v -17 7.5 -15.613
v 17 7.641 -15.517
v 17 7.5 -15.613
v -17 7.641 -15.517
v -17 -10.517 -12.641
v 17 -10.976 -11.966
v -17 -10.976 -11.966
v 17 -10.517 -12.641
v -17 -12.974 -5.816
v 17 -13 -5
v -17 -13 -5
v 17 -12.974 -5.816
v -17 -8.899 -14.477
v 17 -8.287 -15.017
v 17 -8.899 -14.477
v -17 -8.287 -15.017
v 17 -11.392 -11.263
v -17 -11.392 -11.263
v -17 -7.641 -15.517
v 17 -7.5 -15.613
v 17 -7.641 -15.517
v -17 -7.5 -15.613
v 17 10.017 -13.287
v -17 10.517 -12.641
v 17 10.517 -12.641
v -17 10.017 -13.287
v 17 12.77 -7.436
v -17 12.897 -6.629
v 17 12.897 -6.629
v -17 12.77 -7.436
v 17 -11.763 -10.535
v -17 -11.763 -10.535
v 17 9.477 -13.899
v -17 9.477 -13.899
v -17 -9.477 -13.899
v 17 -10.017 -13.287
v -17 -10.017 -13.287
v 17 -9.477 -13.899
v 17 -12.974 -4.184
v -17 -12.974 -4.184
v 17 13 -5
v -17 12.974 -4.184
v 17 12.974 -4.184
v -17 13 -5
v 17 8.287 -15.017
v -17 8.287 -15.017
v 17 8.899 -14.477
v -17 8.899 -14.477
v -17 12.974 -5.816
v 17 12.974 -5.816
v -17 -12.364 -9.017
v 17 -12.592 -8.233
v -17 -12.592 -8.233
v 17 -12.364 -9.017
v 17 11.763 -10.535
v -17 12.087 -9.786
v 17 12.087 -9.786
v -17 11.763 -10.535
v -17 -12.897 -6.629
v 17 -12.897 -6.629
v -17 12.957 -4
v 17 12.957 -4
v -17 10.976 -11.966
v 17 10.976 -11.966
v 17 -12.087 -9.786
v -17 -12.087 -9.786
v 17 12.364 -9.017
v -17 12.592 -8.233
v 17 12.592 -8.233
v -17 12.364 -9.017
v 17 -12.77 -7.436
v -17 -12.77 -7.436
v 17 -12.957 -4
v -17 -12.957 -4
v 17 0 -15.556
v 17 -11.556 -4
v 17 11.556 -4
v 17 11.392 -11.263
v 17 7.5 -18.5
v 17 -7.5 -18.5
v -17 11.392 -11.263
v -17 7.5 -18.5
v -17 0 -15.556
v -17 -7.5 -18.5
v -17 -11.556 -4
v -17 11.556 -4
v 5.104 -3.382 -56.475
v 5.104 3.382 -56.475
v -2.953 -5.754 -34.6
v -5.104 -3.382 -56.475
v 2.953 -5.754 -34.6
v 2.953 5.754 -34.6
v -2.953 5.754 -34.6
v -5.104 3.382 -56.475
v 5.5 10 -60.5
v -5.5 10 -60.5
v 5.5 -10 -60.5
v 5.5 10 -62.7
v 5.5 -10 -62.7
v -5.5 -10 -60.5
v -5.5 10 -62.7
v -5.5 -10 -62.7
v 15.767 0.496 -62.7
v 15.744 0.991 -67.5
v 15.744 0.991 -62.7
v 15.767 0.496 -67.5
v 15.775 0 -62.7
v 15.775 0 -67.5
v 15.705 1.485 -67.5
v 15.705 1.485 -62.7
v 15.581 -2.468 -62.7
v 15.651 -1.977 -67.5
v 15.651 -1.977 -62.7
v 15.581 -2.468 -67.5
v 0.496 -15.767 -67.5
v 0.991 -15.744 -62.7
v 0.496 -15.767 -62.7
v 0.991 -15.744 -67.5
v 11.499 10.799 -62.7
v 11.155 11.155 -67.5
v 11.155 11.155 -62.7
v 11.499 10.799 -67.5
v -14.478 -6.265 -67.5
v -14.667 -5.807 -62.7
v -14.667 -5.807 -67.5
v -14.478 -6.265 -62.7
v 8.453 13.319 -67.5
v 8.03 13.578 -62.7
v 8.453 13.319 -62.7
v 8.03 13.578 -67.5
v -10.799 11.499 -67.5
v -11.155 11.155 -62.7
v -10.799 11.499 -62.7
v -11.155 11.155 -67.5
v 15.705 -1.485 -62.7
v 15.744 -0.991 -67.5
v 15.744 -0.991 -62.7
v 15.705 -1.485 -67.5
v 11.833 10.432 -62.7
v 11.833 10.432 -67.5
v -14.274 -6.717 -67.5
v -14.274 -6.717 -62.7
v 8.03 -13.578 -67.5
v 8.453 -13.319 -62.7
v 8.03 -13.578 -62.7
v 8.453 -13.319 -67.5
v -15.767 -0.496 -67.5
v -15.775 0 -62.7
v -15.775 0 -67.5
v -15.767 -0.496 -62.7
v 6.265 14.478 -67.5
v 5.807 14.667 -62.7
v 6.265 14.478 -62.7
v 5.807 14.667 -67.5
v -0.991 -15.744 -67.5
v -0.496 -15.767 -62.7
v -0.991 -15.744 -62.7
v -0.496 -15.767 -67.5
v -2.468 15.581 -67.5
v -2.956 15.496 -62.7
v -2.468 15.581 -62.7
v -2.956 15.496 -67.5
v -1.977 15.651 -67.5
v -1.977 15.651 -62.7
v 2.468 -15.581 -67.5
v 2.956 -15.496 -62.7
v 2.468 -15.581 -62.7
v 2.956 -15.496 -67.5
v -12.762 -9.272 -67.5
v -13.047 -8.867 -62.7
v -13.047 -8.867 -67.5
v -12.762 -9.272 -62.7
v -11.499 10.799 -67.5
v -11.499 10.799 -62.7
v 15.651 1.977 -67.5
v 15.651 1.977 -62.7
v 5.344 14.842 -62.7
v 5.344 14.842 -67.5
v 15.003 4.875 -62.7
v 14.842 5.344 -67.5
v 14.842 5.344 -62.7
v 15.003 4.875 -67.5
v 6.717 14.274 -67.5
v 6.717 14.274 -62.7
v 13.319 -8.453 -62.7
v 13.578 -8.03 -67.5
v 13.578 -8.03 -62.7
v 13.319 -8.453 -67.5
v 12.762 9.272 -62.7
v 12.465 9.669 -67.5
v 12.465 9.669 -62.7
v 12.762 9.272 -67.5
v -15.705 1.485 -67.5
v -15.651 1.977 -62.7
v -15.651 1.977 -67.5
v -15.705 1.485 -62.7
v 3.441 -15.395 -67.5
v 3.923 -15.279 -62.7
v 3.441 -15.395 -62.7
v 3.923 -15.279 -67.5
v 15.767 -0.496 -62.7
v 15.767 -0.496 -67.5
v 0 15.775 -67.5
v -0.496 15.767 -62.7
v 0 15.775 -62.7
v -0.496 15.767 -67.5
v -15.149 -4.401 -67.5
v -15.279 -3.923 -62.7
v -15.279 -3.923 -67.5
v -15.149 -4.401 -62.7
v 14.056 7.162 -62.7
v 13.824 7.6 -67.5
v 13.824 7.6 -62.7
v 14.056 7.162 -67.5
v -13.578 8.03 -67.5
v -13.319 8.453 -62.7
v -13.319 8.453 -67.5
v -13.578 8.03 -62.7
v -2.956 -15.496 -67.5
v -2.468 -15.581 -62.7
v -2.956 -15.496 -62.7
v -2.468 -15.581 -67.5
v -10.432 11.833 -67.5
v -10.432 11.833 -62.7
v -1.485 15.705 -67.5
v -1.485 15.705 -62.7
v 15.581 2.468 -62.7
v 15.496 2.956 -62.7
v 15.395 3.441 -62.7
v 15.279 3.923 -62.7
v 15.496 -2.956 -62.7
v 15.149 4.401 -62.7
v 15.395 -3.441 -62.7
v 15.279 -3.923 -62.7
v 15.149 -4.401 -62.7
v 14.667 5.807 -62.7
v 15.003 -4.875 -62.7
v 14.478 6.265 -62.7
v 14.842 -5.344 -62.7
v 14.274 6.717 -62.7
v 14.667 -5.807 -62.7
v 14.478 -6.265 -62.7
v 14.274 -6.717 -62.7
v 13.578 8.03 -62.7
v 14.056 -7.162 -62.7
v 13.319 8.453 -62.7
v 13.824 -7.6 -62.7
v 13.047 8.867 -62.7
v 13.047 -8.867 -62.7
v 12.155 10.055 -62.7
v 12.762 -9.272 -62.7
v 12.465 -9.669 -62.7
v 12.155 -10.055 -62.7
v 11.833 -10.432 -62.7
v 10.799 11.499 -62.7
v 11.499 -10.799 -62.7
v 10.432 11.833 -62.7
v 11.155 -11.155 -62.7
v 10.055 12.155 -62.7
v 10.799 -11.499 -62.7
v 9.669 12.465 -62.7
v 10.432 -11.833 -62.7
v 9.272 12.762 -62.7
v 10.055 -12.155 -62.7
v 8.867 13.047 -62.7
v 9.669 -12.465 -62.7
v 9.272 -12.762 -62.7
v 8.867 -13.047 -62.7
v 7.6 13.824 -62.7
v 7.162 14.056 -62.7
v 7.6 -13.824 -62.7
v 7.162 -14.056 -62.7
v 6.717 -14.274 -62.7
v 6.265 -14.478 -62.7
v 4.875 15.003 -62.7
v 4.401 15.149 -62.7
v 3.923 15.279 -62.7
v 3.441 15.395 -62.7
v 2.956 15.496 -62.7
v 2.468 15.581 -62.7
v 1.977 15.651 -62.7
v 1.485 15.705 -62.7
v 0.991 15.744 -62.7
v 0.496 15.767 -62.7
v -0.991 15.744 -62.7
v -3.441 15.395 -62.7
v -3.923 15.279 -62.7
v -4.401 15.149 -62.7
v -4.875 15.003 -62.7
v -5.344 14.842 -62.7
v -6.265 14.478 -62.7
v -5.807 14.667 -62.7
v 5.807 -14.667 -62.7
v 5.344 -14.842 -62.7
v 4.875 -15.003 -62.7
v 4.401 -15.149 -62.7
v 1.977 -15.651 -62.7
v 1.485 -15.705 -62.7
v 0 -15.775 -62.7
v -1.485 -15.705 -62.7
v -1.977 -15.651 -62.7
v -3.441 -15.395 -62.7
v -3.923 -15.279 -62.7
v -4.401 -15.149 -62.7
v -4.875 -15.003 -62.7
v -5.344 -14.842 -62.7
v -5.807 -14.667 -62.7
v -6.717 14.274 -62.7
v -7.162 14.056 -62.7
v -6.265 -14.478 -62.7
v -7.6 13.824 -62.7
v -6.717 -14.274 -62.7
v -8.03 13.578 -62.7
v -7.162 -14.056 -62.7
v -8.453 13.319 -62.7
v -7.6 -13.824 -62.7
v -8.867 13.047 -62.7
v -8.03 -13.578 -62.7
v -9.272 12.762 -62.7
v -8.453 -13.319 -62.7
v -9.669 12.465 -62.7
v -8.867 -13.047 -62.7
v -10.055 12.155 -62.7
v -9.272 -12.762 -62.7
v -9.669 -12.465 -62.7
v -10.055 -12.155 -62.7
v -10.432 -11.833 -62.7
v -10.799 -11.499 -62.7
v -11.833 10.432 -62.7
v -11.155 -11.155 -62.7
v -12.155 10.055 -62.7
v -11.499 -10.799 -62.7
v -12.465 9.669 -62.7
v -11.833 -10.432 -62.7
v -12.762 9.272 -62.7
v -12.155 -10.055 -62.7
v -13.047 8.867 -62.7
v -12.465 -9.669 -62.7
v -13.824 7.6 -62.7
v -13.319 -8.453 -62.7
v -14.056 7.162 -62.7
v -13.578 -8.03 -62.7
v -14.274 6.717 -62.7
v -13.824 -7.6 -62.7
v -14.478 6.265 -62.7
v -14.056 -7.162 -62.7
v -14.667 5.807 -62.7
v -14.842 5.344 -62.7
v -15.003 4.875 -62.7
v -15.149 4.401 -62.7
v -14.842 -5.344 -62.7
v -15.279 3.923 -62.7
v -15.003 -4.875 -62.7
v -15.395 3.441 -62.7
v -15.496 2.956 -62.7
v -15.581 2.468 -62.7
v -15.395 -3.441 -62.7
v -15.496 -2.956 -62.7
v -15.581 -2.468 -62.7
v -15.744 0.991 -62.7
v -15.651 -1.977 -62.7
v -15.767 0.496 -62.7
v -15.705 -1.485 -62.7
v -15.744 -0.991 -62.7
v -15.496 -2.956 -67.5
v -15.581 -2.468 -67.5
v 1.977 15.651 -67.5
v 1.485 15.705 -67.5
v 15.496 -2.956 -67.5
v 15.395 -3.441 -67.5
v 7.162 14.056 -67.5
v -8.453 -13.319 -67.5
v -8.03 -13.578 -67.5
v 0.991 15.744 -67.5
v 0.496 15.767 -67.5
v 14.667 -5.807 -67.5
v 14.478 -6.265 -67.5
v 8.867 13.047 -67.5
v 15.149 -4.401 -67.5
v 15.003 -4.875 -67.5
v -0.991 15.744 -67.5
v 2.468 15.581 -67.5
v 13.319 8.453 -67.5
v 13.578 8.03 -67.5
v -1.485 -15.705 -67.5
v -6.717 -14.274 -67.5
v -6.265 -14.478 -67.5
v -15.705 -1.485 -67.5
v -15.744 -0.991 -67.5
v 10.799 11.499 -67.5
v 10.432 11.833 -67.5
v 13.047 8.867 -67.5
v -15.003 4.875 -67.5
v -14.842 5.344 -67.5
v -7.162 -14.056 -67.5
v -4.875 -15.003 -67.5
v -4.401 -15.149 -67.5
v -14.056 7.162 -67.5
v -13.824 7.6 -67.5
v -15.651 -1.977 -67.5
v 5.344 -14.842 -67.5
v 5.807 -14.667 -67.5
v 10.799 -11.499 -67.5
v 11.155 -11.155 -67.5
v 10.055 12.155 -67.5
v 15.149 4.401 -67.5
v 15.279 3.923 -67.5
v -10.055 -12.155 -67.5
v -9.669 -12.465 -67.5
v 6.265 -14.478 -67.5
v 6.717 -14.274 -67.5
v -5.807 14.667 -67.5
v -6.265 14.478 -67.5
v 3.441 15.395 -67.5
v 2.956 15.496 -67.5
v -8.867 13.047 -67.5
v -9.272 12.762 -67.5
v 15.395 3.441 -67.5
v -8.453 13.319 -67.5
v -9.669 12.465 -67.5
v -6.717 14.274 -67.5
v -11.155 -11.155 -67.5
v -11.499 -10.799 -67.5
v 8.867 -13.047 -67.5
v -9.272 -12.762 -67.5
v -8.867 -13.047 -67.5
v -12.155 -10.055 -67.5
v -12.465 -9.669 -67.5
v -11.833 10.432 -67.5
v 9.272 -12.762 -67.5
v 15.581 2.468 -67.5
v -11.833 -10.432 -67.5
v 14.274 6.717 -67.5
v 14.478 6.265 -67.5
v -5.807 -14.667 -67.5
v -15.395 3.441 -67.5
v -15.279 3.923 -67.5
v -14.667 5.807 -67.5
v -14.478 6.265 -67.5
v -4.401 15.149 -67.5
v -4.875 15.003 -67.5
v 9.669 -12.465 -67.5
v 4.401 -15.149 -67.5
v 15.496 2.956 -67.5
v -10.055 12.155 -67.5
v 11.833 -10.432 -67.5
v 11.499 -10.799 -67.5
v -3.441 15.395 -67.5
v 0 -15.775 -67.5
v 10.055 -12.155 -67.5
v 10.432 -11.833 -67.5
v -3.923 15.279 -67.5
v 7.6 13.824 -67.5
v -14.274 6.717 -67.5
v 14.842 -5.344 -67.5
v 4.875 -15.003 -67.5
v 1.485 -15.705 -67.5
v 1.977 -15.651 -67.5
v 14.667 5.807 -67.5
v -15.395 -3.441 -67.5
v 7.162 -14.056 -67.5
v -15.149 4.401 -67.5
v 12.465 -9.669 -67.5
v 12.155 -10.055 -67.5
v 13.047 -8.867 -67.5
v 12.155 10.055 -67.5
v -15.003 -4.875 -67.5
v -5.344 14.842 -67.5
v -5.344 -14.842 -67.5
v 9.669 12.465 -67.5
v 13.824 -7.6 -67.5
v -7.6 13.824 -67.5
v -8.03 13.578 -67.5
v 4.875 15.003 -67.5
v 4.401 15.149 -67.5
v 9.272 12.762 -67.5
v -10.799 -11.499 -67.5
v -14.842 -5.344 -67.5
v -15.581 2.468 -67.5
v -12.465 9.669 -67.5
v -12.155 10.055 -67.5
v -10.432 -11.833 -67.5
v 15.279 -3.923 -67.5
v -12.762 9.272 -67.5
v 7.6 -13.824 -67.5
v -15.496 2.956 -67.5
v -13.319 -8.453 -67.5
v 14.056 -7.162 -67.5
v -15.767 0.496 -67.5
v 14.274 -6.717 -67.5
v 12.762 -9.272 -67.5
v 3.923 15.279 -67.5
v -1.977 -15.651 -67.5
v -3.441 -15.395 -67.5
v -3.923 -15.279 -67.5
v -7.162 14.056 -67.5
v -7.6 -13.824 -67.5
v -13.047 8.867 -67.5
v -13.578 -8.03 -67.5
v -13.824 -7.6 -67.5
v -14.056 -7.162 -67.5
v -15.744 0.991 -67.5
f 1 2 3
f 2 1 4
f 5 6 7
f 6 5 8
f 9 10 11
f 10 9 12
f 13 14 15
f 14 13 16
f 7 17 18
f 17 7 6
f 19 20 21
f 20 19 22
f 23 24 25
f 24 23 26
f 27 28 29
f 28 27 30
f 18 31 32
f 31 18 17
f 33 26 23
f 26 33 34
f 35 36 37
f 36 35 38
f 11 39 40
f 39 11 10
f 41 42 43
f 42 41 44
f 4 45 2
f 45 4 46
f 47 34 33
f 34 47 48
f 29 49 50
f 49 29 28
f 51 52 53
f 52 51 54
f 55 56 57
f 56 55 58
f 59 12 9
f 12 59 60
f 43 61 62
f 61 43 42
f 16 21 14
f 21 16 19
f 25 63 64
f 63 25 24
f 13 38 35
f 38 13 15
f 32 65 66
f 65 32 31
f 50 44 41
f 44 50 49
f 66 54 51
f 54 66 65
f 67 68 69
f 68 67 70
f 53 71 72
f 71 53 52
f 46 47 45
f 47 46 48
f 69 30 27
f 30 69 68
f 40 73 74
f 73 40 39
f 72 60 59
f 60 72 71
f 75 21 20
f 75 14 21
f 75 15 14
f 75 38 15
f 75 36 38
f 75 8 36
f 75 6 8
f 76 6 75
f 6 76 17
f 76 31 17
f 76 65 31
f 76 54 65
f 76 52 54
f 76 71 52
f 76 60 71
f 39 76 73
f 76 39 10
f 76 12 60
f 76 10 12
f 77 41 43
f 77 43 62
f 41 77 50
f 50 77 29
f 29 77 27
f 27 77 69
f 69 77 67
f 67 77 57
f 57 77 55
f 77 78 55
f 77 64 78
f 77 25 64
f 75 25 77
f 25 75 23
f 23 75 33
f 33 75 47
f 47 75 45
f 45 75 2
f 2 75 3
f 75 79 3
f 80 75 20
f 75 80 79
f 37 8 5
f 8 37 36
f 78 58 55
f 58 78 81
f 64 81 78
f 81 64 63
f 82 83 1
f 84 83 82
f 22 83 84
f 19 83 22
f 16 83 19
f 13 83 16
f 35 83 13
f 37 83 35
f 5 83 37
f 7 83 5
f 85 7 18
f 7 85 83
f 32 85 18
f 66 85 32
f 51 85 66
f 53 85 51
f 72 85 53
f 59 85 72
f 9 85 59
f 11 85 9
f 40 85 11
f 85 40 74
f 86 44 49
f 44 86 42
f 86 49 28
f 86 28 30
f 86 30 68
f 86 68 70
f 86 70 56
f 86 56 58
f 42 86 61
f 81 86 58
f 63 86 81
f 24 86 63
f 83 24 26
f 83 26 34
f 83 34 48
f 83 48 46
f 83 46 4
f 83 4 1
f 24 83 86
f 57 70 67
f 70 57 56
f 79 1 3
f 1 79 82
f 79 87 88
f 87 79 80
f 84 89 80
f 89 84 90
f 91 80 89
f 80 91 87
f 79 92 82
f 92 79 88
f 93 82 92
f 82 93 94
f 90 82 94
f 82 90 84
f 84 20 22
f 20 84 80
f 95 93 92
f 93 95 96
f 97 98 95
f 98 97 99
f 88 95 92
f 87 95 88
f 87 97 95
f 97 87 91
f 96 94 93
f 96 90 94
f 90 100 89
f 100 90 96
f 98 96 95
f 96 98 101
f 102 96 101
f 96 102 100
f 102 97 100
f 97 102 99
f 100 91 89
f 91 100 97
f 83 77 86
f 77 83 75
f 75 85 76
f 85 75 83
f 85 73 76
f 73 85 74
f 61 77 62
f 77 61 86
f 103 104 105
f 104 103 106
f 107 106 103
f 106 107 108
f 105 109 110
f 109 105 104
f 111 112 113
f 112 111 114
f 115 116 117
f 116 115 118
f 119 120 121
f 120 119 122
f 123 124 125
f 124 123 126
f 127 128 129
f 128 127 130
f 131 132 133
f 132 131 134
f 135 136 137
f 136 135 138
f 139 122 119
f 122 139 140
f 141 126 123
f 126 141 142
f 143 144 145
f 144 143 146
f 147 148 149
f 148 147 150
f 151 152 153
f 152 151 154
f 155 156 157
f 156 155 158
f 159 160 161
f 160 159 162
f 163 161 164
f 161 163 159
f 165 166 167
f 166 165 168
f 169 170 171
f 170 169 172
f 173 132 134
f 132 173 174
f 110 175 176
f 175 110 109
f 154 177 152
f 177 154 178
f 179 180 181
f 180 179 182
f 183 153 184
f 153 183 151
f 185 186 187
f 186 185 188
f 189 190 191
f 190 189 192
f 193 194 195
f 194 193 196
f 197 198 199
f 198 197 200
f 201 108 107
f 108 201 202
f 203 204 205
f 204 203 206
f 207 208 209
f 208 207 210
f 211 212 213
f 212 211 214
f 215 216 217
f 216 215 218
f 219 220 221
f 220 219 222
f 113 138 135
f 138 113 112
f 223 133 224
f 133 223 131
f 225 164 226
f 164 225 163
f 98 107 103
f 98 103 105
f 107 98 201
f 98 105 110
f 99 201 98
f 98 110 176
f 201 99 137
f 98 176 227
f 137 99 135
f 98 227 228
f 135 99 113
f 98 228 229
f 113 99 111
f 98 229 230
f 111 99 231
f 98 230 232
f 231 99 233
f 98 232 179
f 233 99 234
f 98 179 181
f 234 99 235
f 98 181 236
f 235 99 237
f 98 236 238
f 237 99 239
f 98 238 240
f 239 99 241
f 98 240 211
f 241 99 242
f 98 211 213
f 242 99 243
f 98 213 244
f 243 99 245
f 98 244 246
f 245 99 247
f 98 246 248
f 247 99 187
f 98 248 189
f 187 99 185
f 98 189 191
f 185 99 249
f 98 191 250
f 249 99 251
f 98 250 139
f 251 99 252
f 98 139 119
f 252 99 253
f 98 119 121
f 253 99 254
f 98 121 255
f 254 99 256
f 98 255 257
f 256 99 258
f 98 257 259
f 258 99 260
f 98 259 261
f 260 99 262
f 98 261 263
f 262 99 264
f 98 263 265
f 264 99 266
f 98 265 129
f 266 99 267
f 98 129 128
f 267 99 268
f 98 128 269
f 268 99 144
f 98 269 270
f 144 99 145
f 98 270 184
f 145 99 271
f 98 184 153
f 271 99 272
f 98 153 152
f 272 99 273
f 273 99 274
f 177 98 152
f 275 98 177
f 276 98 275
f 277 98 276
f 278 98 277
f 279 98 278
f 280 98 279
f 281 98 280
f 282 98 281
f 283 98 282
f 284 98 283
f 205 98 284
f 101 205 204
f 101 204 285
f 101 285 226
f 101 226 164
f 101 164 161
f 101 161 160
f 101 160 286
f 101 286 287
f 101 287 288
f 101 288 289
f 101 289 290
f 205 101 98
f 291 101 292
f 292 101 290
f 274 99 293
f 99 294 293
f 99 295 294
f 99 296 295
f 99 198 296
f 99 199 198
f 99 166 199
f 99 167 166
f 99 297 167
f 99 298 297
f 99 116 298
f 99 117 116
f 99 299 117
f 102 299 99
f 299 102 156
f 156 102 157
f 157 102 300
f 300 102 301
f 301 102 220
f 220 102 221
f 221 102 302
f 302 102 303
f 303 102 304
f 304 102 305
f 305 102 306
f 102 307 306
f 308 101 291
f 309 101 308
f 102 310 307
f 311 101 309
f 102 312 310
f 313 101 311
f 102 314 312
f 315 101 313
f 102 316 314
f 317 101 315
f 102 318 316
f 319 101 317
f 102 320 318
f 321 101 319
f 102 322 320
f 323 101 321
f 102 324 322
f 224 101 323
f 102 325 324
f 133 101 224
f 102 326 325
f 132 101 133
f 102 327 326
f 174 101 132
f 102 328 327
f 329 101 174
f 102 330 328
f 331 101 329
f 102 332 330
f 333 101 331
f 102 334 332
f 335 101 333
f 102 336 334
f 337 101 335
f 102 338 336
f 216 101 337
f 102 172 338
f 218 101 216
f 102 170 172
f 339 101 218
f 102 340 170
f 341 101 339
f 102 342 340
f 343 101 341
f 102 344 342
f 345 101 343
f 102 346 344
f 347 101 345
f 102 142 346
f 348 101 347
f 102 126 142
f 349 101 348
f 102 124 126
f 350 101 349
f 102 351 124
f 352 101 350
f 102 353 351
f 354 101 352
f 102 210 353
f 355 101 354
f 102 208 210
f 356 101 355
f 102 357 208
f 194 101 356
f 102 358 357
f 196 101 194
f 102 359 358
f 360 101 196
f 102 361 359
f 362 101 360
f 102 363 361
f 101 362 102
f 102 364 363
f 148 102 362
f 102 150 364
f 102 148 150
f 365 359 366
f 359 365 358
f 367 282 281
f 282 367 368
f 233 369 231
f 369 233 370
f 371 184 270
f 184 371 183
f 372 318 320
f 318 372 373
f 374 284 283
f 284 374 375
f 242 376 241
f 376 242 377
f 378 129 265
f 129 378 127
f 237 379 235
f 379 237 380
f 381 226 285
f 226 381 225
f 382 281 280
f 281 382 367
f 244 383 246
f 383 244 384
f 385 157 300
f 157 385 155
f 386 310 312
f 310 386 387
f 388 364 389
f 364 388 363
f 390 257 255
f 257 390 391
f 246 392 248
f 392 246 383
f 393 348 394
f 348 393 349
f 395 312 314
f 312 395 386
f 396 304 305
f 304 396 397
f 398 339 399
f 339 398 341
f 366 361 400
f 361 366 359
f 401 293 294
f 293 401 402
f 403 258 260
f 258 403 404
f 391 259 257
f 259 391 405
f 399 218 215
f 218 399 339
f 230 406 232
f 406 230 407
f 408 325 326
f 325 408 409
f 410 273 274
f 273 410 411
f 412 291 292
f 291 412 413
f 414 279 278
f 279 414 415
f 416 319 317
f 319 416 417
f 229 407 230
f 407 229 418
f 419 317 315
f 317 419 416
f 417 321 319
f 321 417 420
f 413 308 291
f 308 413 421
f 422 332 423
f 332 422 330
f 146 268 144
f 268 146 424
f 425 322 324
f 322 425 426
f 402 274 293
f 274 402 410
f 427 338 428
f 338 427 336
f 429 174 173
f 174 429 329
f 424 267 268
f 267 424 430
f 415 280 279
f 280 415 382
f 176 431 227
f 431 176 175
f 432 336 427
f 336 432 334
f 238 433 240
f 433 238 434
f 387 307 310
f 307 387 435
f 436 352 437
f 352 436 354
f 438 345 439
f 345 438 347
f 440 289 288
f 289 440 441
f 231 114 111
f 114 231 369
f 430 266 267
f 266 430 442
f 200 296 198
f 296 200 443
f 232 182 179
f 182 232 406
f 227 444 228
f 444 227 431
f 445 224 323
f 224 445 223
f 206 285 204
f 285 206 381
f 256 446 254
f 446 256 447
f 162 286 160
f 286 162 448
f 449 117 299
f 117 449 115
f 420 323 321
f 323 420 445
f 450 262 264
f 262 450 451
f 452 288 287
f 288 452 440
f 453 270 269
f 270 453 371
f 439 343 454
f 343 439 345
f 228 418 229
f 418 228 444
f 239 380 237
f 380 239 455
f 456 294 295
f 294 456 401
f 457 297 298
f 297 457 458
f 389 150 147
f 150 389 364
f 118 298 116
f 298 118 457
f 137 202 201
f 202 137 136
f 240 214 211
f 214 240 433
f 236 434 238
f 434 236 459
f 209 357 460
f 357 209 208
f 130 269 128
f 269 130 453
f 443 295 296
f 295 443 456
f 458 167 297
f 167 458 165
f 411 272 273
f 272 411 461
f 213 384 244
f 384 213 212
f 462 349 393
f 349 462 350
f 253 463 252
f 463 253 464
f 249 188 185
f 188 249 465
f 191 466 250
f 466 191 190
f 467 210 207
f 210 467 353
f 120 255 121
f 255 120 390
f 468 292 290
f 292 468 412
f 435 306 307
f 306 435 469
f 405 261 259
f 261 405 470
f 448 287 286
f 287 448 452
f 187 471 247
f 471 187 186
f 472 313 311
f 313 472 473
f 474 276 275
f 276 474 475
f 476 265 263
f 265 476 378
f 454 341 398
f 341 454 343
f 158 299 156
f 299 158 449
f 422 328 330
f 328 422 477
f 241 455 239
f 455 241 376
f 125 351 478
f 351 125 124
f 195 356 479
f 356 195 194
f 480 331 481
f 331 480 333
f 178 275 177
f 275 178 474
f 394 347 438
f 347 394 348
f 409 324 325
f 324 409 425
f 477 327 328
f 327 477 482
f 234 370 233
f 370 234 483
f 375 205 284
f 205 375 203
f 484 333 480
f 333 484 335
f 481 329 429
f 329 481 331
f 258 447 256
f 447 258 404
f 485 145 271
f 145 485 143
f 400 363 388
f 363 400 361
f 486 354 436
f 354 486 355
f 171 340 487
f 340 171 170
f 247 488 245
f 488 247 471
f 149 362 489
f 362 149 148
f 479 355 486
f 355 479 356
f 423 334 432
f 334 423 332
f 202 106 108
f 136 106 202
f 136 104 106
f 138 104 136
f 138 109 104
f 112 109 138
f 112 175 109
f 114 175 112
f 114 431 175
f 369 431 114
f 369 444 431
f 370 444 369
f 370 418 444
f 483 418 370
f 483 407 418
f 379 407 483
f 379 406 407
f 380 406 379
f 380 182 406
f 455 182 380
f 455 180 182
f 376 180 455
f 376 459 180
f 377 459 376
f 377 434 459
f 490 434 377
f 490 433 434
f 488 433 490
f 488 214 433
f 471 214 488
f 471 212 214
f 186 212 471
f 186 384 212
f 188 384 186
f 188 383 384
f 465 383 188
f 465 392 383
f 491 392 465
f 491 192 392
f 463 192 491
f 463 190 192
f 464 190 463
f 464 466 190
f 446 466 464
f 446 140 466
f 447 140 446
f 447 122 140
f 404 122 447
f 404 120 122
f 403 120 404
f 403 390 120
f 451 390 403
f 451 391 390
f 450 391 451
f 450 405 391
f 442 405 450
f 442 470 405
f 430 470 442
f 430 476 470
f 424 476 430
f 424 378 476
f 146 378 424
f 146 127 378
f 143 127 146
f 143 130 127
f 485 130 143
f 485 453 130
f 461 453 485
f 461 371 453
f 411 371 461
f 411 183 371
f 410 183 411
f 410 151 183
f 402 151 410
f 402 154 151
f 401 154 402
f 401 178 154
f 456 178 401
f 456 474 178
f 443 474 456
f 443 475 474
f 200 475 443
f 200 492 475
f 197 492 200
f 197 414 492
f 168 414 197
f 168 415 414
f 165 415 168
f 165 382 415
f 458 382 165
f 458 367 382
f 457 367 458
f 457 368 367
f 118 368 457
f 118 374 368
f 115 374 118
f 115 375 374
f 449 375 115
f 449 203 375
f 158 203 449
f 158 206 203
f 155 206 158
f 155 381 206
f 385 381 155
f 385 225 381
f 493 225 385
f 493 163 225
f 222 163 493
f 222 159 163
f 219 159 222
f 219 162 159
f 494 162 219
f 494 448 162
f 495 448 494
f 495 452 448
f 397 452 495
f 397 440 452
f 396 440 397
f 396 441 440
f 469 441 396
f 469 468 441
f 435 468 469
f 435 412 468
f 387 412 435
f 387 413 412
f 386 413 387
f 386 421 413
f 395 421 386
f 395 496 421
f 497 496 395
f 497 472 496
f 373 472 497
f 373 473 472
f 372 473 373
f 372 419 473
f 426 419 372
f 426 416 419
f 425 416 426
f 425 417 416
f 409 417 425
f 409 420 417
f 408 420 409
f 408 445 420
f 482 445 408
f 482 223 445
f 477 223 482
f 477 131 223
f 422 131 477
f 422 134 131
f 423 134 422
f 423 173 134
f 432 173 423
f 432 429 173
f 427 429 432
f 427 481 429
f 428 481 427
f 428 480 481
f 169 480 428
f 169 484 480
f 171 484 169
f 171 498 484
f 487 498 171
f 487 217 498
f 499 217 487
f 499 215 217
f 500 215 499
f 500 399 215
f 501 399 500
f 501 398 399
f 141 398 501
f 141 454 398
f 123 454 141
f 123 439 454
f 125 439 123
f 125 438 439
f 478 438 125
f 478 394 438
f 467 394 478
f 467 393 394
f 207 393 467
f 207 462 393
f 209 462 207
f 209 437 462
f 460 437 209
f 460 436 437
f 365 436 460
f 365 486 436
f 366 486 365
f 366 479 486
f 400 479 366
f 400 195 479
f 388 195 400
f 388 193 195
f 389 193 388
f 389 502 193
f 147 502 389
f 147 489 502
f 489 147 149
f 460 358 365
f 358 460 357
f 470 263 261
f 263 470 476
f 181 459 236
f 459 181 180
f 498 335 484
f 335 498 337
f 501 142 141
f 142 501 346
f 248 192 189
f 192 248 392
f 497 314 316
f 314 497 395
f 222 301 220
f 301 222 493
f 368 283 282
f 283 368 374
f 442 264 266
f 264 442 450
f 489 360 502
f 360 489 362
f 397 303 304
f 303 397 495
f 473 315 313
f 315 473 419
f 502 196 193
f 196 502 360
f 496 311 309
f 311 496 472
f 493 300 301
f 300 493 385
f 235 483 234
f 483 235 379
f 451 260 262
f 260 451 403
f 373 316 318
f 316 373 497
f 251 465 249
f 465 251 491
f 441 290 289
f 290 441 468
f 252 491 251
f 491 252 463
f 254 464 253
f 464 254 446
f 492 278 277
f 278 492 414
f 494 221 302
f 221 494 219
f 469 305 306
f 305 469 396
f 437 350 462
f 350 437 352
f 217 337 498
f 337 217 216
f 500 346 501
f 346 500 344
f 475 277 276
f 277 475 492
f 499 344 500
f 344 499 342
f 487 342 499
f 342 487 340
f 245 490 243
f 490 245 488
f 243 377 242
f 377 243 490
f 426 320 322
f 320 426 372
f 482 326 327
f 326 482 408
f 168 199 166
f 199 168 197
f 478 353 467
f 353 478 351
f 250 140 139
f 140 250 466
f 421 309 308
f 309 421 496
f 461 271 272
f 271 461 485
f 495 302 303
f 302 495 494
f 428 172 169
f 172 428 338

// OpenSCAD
module Cell_Stand(){
difference(){
    
union(){    
rotate([0,90,0])cylinder(d=26,h=40,center=true,$fn=100);
hull(){    
translate([0,0,-11])cube([40,15,5],center=true);
translate([0,0,-70])cube([8,6,10],center=true);    
}
hull(){    
translate([0,0,-50])cube([5,10,10],center=true); 
translate([0,0,-75])cube([11,30,5],center=true);    
}   
}
rotate([0,90,0])cylinder(d=22,h=51,center=true,$fn=100);    
translate([0,0,8.5])cube([51,30,15],center=true);    
}

difference(){
translate([0,0,-82.58+4])cylinder(d=40,h=8,$fn=200,center=true);
translate([25/2,0,-83])cylinder(d=6.2,h=10,$fn=20);
translate([-25/2,0,-83])cylinder(d=6.2,h=10,$fn=20);

translate([25/2,0,-74.6-6])cylinder(d=11,h=10,$fn=40);
translate([-25/2,0,-74.6-6])cylinder(d=11,h=10,$fn=40);      
}
}



module Cell_Stand2(){
difference(){
    
union(){    
rotate([0,90,0])cylinder(d=26,h=34,center=true,$fn=100);
hull(){    
translate([0,0,-11])cube([34,15,5],center=true);
translate([0,0,-50])cube([8,6,10],center=true);    
}
hull(){    
translate([0,0,-30])cube([5,10,10],center=true); 
translate([0,0,-58])cube([11,20,5],center=true);    
}   
}
//rotate([0,90,0])cylinder(d=22,h=51,center=true,$fn=100):
translate([0,0,5])rotate([45,0,0])cube([50,22,22],center=true);   
translate([0,0,8.5])cube([51,30,15],center=true);    
}

difference(){
translate([0,0,-60.1])cylinder(d=31.55,h=4.8,$fn=200,center=true);
//translate([25/2,0,-83])cylinder(d=6.2,h=10,$fn=20);
//translate([-25/2,0,-83])cylinder(d=6.2,h=10,$fn=20);

//translate([25/2,0,-74.6-6])cylinder(d=11,h=10,$fn=40);   
}
}



module Cell_Window_Bonding_Jig(){ 
difference(){
cylinder(d=27,h=15,$fn=100,center=true); 
cylinder(d=22,h=16,$fn=100,center=true);
translate([0,0,7.1])cylinder(d1=22,d2=23,h=1,$fn=100,center=true);    
translate([0,0,-2.6])cylinder(d=24,h=10,$fn=100,center=true);
translate([0,0,-2.6])rotate([0,0,7])cube([15,30,10],center=true); 
translate([0,0,-2.6])cube([30,15,10],center=true);
translate([5,-5,0])rotate([0,0,45])cube([21.5,15,20],center=true);    
}   
}



//Cell_Stand();
translate([0,0,-5])Cell_Stand2();
//Cell_Window_Bonding_Jig();

// Beam Ht=82.58mm
//#translate([0,0,-82.58-2])cube([50,50,4],center=true);
